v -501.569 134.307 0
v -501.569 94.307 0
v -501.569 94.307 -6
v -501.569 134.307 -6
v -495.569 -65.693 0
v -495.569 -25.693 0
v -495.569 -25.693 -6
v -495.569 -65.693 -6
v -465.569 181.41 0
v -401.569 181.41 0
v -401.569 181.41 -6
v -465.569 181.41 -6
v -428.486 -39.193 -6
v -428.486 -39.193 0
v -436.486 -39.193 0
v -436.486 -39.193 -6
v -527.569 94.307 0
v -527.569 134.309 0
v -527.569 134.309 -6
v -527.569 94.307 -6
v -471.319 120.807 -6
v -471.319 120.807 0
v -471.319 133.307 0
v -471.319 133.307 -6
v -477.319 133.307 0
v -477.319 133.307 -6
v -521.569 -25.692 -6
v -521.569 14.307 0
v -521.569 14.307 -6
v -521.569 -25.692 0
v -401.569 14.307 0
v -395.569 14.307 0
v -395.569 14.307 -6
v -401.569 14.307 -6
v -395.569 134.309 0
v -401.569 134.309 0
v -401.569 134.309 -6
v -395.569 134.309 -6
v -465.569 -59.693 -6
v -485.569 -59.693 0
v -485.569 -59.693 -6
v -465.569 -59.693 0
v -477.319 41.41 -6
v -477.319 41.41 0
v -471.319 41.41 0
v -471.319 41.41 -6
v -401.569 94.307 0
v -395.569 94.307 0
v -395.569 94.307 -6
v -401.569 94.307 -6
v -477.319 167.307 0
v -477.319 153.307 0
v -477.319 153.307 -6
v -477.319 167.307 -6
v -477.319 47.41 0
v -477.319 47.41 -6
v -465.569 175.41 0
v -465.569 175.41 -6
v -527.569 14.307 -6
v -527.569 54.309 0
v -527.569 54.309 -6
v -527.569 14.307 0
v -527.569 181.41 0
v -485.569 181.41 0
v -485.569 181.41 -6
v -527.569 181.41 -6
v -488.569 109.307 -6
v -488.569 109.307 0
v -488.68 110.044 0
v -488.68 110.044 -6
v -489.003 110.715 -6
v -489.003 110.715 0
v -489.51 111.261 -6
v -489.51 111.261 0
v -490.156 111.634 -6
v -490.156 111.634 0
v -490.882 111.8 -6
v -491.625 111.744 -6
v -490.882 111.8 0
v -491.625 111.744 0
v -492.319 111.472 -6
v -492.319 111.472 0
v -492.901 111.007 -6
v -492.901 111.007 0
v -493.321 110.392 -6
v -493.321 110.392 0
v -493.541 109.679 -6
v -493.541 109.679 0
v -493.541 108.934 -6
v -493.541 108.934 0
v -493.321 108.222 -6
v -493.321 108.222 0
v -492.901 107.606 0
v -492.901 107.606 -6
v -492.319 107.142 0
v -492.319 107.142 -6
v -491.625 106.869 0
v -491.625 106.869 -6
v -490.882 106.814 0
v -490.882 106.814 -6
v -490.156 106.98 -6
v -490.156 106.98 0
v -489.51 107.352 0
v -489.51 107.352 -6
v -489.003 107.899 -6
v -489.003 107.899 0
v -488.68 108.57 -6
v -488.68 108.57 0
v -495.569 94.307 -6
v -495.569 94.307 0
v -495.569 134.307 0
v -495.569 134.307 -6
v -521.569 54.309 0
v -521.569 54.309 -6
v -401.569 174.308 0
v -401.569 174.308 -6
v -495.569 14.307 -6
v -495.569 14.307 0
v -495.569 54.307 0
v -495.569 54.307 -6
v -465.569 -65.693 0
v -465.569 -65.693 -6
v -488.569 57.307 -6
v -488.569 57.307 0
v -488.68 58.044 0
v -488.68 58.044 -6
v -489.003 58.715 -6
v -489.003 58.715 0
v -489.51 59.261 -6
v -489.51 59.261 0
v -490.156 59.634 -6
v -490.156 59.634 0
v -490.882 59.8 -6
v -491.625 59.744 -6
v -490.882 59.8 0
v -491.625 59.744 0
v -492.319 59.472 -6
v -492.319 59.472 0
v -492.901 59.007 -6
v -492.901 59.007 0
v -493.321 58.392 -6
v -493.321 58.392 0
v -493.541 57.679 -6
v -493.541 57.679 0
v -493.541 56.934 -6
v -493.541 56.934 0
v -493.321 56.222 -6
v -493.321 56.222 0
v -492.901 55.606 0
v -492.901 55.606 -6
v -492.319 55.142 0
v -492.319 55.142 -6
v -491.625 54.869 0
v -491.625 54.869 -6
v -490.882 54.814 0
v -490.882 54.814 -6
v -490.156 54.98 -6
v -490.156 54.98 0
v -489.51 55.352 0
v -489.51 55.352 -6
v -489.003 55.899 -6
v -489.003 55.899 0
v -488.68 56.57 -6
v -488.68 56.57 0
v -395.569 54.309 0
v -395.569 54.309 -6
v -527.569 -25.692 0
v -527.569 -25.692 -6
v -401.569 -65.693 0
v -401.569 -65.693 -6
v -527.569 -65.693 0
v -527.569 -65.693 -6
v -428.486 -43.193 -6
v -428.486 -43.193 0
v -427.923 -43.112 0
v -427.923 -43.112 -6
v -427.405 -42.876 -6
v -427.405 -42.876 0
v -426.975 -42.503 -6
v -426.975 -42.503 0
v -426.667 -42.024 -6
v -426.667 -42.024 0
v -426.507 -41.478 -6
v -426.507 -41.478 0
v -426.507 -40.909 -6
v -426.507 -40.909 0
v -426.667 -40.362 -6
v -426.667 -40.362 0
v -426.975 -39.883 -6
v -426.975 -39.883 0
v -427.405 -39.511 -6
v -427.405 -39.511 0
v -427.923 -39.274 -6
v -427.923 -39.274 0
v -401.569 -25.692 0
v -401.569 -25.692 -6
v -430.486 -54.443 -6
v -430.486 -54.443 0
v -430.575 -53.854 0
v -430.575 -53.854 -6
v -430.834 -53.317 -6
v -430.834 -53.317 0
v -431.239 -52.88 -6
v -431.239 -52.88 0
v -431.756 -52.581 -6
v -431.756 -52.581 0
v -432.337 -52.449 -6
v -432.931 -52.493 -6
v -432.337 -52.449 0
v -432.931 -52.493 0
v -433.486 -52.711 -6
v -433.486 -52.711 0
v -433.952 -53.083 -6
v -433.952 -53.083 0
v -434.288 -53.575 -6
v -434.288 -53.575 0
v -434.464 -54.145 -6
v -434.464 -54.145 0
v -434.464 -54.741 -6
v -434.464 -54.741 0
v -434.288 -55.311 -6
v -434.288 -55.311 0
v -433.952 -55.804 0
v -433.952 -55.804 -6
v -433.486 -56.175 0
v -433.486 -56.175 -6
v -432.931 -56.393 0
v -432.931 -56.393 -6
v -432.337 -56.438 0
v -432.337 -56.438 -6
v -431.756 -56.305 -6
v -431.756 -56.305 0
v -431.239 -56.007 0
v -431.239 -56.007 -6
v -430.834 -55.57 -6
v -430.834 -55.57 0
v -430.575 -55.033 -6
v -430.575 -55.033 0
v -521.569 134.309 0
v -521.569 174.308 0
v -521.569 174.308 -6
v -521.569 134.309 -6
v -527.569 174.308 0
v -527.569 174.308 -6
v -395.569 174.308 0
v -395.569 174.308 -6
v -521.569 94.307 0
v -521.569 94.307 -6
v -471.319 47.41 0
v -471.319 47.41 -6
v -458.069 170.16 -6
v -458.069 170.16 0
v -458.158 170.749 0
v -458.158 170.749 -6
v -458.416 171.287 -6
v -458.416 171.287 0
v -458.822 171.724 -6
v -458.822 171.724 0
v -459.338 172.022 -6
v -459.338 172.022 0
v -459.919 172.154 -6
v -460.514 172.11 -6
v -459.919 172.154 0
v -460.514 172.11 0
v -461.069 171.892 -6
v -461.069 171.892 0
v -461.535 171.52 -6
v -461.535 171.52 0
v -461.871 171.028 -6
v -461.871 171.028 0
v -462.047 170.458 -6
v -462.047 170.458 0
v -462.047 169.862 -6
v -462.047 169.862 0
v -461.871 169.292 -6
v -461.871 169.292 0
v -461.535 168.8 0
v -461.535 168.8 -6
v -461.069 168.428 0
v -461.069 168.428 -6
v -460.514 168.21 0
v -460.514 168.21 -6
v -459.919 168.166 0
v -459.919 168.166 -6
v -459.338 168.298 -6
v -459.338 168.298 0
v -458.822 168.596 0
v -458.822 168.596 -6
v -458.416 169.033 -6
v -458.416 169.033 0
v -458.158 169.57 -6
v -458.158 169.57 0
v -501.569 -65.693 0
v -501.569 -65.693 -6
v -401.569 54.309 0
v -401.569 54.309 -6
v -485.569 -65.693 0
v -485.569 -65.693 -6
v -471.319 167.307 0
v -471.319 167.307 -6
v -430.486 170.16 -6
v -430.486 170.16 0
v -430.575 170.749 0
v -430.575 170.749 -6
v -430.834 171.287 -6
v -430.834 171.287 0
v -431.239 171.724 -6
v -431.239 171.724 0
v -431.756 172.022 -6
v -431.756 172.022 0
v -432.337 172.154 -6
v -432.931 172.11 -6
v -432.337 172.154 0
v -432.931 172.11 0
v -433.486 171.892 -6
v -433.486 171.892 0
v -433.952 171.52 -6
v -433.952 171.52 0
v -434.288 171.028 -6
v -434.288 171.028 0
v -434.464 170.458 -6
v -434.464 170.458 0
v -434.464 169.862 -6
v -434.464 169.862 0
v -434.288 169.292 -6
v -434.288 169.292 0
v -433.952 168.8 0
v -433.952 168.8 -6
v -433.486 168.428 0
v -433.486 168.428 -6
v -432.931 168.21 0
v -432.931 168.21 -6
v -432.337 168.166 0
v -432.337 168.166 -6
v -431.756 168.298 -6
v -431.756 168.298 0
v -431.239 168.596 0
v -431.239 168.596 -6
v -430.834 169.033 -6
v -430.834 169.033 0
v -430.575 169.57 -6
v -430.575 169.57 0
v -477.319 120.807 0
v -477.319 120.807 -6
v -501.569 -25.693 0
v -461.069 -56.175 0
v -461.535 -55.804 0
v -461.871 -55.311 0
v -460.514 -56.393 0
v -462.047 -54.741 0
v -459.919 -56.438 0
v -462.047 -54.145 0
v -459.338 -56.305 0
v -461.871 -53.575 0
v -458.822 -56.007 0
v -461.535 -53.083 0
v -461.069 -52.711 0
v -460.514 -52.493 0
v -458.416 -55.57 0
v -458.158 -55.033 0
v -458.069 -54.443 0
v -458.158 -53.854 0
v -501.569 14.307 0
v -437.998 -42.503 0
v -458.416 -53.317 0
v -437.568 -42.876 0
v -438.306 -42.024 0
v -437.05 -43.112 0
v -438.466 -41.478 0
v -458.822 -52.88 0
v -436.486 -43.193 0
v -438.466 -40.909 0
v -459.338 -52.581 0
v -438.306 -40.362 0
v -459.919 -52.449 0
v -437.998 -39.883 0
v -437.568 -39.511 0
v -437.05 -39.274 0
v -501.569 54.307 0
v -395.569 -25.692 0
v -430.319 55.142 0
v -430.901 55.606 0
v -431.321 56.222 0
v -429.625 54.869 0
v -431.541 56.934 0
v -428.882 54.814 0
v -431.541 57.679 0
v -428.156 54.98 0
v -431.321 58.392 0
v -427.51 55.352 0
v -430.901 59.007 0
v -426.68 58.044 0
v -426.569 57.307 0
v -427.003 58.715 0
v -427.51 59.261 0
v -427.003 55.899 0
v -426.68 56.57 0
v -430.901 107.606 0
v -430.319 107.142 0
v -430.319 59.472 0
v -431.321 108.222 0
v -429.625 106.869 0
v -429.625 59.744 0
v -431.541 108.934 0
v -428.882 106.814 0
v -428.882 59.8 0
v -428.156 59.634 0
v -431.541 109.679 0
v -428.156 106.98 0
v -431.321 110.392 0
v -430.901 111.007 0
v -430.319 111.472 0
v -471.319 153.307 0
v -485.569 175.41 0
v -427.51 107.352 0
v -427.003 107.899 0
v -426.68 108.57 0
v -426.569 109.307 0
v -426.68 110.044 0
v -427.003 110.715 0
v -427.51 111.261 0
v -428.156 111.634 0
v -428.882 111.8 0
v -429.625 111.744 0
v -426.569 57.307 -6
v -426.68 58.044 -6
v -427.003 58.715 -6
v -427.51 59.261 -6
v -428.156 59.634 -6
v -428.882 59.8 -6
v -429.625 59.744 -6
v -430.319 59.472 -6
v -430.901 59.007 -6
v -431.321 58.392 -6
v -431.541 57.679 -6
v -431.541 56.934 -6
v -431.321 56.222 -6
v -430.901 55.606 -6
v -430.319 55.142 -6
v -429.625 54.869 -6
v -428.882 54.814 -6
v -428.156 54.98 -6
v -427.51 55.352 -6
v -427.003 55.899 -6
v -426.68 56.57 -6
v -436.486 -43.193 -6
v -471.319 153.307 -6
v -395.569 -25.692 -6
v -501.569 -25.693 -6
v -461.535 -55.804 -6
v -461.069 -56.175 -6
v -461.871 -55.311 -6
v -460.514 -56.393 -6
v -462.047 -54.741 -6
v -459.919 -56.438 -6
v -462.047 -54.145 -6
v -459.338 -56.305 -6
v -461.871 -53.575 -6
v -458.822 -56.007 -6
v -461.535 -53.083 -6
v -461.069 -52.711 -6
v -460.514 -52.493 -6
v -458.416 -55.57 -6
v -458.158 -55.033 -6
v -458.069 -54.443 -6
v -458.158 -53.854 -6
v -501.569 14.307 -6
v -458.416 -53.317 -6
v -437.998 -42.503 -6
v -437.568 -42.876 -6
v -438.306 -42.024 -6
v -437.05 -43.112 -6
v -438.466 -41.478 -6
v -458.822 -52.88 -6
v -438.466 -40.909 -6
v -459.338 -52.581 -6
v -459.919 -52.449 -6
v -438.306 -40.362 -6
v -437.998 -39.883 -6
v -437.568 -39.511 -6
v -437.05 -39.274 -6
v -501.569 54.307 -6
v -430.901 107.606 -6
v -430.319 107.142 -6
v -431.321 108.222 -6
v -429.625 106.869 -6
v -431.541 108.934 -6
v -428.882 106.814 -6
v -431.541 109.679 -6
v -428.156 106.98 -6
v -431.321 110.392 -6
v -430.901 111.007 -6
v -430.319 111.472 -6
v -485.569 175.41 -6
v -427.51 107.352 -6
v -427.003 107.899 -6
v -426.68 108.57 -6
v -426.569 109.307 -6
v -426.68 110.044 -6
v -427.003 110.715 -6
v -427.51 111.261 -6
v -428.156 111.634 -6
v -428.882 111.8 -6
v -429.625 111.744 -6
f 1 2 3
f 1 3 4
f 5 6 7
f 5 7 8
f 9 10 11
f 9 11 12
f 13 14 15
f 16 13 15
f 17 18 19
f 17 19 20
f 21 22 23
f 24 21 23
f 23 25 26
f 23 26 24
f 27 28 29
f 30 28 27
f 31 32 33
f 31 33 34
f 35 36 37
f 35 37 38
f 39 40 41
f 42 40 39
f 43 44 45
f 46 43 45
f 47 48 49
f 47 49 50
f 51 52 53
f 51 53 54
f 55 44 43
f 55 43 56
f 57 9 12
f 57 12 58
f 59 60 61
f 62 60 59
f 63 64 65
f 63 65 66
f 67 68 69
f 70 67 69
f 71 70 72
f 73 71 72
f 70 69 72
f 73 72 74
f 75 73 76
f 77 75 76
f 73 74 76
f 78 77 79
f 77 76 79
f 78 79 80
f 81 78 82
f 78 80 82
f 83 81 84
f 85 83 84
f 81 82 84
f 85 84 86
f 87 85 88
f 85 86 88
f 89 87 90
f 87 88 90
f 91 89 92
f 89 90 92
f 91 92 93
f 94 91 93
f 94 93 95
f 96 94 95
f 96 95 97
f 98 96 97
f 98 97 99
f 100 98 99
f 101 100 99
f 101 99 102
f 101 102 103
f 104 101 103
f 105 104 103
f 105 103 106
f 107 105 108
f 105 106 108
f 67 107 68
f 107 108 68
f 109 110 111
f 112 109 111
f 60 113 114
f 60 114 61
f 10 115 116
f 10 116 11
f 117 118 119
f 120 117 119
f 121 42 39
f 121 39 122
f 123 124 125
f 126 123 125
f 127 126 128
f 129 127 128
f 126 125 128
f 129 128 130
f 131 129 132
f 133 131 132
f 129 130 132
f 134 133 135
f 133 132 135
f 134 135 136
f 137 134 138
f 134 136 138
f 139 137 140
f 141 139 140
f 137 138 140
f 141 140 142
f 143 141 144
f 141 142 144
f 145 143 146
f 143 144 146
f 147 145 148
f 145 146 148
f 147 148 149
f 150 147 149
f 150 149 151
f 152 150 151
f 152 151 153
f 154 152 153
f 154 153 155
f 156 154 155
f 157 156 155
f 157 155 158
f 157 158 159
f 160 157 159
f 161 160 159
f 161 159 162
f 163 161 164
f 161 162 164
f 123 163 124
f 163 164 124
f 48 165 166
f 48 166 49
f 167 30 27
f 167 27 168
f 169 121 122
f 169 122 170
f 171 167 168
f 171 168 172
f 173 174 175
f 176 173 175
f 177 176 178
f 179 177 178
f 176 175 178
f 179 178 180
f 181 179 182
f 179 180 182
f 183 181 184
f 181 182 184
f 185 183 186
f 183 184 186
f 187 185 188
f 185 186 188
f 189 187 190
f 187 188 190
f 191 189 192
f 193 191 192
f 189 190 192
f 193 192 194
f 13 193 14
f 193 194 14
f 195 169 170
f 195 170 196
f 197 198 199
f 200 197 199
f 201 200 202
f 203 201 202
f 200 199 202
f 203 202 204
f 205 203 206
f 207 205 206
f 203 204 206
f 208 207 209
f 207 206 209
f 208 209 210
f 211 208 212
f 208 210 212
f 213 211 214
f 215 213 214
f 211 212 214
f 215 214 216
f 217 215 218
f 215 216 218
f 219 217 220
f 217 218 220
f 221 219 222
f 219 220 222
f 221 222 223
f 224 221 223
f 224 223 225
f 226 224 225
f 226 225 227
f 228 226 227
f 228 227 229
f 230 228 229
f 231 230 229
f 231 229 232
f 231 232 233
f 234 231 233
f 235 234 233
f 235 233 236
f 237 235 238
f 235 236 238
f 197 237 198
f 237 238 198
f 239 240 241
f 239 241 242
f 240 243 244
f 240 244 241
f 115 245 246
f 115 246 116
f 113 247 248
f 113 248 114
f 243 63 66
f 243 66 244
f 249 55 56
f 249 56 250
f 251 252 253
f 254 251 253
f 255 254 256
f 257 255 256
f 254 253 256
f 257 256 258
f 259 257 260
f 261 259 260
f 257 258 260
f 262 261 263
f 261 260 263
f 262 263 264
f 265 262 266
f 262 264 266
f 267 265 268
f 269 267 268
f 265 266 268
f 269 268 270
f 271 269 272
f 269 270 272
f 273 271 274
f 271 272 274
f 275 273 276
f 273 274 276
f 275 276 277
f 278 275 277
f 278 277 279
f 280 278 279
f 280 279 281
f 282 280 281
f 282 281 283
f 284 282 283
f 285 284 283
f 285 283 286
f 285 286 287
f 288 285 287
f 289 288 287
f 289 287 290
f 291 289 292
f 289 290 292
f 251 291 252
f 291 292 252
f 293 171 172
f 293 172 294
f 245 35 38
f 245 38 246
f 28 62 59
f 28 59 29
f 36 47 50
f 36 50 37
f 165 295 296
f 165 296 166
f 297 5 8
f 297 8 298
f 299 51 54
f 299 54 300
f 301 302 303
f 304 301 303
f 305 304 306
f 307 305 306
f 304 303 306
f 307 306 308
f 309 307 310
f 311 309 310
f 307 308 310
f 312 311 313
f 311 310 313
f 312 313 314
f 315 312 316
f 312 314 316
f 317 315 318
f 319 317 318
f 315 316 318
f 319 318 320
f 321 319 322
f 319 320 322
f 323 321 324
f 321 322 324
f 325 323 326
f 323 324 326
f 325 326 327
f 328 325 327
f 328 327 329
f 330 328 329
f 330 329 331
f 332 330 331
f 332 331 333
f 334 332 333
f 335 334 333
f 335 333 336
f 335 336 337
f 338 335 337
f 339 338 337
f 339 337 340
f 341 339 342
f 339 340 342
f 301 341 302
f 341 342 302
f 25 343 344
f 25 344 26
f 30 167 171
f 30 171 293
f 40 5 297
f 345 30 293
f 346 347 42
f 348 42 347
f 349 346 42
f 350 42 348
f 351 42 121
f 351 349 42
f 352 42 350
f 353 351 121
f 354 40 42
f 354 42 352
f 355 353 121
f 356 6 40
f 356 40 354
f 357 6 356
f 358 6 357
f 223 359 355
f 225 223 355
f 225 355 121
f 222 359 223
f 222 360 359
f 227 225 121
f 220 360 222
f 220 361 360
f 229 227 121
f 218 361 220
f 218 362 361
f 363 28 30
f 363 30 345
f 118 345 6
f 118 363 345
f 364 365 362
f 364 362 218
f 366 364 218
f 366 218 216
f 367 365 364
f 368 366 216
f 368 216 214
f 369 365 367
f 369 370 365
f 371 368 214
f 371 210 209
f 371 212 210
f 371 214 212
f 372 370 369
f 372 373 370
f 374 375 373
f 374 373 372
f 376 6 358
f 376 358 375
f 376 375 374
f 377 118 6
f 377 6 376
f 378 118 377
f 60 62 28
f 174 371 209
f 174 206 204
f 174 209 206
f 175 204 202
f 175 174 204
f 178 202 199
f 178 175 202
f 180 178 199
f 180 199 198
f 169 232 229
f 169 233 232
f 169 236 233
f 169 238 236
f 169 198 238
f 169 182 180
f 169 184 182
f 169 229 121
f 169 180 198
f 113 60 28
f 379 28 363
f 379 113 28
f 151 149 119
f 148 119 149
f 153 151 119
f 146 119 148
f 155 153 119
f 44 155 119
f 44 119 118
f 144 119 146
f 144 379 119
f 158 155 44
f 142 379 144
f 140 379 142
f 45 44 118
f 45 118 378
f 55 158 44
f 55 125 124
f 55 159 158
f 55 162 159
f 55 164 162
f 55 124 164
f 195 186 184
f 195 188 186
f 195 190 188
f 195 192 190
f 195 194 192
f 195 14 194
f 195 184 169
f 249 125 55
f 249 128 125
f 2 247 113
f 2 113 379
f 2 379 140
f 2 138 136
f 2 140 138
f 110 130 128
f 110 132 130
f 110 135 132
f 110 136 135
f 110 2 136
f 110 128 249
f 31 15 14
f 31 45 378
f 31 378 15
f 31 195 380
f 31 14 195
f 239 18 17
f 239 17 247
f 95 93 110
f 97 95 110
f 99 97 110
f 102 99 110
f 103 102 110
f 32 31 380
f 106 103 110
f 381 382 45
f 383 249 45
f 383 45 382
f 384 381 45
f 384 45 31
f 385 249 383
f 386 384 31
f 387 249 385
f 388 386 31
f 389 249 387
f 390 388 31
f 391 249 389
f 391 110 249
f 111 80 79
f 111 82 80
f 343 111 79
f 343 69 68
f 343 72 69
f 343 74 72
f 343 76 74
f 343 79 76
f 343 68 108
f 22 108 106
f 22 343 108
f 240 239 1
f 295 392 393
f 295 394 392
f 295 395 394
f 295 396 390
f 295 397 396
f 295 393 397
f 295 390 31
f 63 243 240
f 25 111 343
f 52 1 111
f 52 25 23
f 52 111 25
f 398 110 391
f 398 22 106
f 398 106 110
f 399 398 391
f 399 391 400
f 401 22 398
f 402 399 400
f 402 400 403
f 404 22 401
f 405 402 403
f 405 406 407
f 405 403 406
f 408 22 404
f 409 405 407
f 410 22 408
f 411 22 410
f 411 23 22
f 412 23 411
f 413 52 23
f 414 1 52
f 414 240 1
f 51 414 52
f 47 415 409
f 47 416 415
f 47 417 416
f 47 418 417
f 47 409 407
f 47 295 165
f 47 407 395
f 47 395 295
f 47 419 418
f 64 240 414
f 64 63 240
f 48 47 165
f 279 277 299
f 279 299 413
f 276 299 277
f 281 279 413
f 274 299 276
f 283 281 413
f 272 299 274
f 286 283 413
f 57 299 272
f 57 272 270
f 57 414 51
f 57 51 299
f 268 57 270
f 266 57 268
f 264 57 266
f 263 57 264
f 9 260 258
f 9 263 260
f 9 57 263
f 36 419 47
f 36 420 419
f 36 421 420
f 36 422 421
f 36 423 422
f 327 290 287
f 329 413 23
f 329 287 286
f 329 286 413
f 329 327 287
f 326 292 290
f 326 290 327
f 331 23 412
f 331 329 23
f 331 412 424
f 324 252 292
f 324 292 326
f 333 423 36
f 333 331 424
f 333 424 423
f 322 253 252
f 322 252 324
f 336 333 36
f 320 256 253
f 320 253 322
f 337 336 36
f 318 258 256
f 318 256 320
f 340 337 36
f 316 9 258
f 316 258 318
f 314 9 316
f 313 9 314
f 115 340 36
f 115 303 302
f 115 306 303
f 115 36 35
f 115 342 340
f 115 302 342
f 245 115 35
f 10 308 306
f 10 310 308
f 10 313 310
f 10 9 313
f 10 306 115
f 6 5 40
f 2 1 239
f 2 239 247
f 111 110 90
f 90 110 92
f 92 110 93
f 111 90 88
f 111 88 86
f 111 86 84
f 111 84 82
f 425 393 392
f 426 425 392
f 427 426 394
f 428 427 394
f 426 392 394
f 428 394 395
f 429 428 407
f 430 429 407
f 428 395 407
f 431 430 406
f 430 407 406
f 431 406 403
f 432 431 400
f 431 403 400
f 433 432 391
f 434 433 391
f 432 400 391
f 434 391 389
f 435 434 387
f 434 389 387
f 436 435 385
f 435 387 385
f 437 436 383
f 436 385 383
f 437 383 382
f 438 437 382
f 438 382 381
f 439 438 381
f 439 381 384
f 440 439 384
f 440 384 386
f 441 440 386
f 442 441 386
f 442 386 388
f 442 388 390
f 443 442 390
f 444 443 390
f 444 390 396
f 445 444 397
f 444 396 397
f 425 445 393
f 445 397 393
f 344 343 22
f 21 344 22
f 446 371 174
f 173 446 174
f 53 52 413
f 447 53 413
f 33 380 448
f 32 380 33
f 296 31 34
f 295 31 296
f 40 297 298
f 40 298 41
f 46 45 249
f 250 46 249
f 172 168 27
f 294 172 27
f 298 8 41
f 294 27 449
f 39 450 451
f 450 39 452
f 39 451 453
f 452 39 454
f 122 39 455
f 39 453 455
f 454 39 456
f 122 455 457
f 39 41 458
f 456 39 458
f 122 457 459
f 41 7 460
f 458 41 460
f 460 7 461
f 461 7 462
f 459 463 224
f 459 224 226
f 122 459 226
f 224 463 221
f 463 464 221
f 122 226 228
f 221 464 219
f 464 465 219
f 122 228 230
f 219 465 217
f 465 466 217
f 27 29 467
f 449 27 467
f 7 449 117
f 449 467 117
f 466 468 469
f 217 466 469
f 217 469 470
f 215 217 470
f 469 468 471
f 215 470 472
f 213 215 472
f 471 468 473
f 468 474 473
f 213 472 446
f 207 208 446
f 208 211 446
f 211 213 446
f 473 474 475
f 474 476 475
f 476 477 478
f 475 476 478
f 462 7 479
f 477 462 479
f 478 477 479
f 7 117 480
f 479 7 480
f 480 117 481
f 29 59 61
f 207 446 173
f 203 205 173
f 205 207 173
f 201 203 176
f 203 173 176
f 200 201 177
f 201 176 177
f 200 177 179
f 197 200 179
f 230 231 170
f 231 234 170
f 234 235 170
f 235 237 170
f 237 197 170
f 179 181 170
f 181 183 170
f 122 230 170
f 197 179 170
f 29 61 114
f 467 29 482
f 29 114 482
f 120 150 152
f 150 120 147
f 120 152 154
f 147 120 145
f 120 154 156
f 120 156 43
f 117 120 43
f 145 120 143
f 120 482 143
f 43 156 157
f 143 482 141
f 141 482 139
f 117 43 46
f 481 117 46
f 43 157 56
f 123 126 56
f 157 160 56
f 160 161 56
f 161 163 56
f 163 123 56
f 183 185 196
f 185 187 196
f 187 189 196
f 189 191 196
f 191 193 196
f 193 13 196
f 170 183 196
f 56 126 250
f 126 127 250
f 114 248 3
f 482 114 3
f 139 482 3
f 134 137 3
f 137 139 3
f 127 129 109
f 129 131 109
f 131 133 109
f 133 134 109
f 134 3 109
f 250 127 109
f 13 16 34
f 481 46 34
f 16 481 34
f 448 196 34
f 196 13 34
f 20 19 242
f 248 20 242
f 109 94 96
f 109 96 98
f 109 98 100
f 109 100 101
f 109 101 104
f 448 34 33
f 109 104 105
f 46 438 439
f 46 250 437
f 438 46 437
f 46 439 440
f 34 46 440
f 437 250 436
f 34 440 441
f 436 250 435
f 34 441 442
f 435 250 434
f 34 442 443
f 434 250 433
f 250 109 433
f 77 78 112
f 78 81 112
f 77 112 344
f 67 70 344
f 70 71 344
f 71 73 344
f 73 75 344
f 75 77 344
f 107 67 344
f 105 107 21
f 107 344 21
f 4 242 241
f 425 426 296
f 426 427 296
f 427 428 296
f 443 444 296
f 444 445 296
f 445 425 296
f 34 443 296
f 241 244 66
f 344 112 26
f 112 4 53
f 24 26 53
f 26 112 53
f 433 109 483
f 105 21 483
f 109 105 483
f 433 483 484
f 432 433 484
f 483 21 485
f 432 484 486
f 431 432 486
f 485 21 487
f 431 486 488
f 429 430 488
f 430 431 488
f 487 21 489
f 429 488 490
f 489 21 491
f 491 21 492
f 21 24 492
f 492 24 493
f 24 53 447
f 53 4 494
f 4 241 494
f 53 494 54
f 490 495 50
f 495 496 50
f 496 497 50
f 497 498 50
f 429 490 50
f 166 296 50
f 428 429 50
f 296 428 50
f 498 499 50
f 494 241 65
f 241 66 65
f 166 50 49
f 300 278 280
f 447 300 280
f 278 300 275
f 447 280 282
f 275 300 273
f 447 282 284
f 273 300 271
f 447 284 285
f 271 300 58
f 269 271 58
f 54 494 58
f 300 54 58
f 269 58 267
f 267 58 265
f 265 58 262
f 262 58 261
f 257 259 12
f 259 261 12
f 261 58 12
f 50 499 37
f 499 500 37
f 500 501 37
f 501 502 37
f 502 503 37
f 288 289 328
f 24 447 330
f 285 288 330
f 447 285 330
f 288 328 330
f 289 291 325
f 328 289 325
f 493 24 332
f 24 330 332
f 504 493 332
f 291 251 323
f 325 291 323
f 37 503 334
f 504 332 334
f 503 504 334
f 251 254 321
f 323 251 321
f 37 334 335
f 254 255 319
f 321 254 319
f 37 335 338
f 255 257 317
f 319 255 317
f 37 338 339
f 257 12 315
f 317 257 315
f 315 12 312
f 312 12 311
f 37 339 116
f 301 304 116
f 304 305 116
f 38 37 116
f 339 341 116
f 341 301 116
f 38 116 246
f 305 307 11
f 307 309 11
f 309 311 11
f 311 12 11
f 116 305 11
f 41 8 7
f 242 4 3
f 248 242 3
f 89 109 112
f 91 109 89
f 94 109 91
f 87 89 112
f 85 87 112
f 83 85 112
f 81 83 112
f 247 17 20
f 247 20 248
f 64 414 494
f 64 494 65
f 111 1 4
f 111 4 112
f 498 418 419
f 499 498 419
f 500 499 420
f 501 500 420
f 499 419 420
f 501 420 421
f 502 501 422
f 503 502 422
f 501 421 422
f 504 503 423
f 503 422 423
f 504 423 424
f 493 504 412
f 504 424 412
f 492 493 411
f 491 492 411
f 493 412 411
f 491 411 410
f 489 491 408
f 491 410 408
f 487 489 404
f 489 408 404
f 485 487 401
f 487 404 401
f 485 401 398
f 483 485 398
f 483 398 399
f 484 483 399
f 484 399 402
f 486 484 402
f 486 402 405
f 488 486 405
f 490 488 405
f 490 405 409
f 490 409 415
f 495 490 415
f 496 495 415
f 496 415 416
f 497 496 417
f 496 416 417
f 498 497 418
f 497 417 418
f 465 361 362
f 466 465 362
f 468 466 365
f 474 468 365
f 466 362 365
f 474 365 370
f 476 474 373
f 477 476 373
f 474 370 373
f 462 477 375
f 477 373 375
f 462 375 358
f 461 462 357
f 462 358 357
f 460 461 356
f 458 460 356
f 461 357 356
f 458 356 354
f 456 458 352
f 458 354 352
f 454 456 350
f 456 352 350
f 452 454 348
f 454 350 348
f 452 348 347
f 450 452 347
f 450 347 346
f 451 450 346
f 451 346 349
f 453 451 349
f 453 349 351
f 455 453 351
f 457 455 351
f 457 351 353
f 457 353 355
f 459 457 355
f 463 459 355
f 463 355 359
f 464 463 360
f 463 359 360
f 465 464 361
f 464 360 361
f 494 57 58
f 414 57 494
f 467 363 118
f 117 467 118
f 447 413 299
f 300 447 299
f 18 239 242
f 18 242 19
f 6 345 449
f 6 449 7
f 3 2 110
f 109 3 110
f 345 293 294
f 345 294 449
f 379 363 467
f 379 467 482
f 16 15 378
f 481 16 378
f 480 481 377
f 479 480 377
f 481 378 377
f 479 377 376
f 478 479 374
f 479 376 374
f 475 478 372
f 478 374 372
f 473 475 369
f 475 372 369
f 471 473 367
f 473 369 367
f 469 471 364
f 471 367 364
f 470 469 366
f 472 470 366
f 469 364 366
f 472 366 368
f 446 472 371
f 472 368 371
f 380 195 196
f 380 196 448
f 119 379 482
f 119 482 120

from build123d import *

# Parameters (mm, degrees)
ESQUISSE1_R        = 2.500000039
ESQUISSE1_R_2      = 2.5
ESQUISSE1_R_3      = 2.50000052
ESQUISSE1_R_4      = 2.500000067
ESQUISSE1_R_5      = 2
ESQUISSE1_W        = 6
ESQUISSE1_H        = 40
ESQUISSE1_H_2      = 14.000000003
ESQUISSE1_H_3      = 12.5
ESQUISSE1_H_4      = 6
BOSS_EXTRU_1_DEPTH = 6


with BuildPart() as part:
    # Esquisse1 → Boss.-Extru.1 (new body)
    with BuildSketch(Plane.XY):
        Polygon((-395.568859933, 174.308023863), (-401.568859933, 174.308023863), (-401.568859933, 181.409908735), (-465.568859933, 181.409908735), (-465.568859933, 175.409908735), (-485.568859933, 175.409908735), (-485.568859933, 181.409908735), (-501.568859933, 181.409908735), (-527.568859933, 181.409908735), (-527.568859933, 174.308023863), (-521.568859933, 174.308023863), (-521.568859933, 134.309238722), (-527.568859933, 134.309238722), (-527.568859933, 94.307416433), (-521.568859933, 94.307416433), (-521.568859933, 54.308631292), (-527.568859933, 54.308631292), (-527.568859933, 14.306809003), (-521.568859933, 14.306809003), (-521.568859933, -25.691976137), (-527.568859933, -25.691976137), (-527.568859933, -65.693190997), (-501.568859933, -65.693190997), (-501.568859933, -25.693190997), (-495.568859933, -25.693190997), (-495.568859933, -65.693190997), (-485.568859933, -65.693190997), (-485.568859933, -59.693190997), (-465.568859933, -59.693190997), (-465.568859933, -65.693190997), (-401.568859933, -65.693190997), (-401.568859933, -25.691976137), (-395.568859933, -25.691976137), (-395.568859933, 14.306809003), (-401.568859933, 14.306809003), (-401.568859933, 54.308631292), (-395.568859933, 54.308631292), (-395.568859933, 94.307416433), (-401.568859933, 94.307416433), (-401.568859933, 134.309238722), (-395.568859933, 134.309238722), align=None)
        with Locations((-491.068859894, 57.306809003)):
            Circle(ESQUISSE1_R, mode=Mode.SUBTRACT)
        with Locations((-491.068859933, 109.306809003)):
            Circle(ESQUISSE1_R_2, mode=Mode.SUBTRACT)
        with Locations((-429.068859933, 109.306809003)):
            Circle(ESQUISSE1_R_3, mode=Mode.SUBTRACT)
        with Locations((-429.068859933, 57.306809003)):
            Circle(ESQUISSE1_R_4, mode=Mode.SUBTRACT)
        with Locations((-460.068859933, 170.159908735)):
            Circle(ESQUISSE1_R_5, mode=Mode.SUBTRACT)
        with Locations((-432.48625686, 170.159908735)):
            Circle(ESQUISSE1_R_5, mode=Mode.SUBTRACT)
        with Locations((-460.068859933, -54.443190997)):
            Circle(ESQUISSE1_R_5, mode=Mode.SUBTRACT)
        with Locations((-432.48625686, -54.443190997)):
            Circle(ESQUISSE1_R_5, mode=Mode.SUBTRACT)
        with BuildLine():
            Line((-428.48625686, -39.193190997), (-436.48625686, -39.193190997))
            ThreePointArc((-436.48625686, -39.193190997), (-438.48625686, -41.193190997), (-436.48625686, -43.193190997))
            Line((-436.48625686, -43.193190997), (-428.48625686, -43.193190997))
            ThreePointArc((-428.48625686, -43.193190997), (-426.48625686, -41.193190997), (-428.48625686, -39.193190997))
        make_face(mode=Mode.SUBTRACT)
        with Locations((-498.568859933, 34.306809003)):
            Rectangle(ESQUISSE1_W, ESQUISSE1_H, mode=Mode.SUBTRACT)
        with Locations((-498.568859933, 114.306809003)):
            Rectangle(ESQUISSE1_W, ESQUISSE1_H, mode=Mode.SUBTRACT)
        with Locations((-474.318859933, 160.306809004)):
            Rectangle(ESQUISSE1_W, ESQUISSE1_H_2, mode=Mode.SUBTRACT)
        with Locations((-474.318859933, 127.056809003)):
            Rectangle(ESQUISSE1_W, ESQUISSE1_H_3, mode=Mode.SUBTRACT)
        with Locations((-474.318859933, 44.409908732)):
            Rectangle(ESQUISSE1_W, ESQUISSE1_H_4, mode=Mode.SUBTRACT)
    extrude(amount=-BOSS_EXTRU_1_DEPTH)


solid = part.part
